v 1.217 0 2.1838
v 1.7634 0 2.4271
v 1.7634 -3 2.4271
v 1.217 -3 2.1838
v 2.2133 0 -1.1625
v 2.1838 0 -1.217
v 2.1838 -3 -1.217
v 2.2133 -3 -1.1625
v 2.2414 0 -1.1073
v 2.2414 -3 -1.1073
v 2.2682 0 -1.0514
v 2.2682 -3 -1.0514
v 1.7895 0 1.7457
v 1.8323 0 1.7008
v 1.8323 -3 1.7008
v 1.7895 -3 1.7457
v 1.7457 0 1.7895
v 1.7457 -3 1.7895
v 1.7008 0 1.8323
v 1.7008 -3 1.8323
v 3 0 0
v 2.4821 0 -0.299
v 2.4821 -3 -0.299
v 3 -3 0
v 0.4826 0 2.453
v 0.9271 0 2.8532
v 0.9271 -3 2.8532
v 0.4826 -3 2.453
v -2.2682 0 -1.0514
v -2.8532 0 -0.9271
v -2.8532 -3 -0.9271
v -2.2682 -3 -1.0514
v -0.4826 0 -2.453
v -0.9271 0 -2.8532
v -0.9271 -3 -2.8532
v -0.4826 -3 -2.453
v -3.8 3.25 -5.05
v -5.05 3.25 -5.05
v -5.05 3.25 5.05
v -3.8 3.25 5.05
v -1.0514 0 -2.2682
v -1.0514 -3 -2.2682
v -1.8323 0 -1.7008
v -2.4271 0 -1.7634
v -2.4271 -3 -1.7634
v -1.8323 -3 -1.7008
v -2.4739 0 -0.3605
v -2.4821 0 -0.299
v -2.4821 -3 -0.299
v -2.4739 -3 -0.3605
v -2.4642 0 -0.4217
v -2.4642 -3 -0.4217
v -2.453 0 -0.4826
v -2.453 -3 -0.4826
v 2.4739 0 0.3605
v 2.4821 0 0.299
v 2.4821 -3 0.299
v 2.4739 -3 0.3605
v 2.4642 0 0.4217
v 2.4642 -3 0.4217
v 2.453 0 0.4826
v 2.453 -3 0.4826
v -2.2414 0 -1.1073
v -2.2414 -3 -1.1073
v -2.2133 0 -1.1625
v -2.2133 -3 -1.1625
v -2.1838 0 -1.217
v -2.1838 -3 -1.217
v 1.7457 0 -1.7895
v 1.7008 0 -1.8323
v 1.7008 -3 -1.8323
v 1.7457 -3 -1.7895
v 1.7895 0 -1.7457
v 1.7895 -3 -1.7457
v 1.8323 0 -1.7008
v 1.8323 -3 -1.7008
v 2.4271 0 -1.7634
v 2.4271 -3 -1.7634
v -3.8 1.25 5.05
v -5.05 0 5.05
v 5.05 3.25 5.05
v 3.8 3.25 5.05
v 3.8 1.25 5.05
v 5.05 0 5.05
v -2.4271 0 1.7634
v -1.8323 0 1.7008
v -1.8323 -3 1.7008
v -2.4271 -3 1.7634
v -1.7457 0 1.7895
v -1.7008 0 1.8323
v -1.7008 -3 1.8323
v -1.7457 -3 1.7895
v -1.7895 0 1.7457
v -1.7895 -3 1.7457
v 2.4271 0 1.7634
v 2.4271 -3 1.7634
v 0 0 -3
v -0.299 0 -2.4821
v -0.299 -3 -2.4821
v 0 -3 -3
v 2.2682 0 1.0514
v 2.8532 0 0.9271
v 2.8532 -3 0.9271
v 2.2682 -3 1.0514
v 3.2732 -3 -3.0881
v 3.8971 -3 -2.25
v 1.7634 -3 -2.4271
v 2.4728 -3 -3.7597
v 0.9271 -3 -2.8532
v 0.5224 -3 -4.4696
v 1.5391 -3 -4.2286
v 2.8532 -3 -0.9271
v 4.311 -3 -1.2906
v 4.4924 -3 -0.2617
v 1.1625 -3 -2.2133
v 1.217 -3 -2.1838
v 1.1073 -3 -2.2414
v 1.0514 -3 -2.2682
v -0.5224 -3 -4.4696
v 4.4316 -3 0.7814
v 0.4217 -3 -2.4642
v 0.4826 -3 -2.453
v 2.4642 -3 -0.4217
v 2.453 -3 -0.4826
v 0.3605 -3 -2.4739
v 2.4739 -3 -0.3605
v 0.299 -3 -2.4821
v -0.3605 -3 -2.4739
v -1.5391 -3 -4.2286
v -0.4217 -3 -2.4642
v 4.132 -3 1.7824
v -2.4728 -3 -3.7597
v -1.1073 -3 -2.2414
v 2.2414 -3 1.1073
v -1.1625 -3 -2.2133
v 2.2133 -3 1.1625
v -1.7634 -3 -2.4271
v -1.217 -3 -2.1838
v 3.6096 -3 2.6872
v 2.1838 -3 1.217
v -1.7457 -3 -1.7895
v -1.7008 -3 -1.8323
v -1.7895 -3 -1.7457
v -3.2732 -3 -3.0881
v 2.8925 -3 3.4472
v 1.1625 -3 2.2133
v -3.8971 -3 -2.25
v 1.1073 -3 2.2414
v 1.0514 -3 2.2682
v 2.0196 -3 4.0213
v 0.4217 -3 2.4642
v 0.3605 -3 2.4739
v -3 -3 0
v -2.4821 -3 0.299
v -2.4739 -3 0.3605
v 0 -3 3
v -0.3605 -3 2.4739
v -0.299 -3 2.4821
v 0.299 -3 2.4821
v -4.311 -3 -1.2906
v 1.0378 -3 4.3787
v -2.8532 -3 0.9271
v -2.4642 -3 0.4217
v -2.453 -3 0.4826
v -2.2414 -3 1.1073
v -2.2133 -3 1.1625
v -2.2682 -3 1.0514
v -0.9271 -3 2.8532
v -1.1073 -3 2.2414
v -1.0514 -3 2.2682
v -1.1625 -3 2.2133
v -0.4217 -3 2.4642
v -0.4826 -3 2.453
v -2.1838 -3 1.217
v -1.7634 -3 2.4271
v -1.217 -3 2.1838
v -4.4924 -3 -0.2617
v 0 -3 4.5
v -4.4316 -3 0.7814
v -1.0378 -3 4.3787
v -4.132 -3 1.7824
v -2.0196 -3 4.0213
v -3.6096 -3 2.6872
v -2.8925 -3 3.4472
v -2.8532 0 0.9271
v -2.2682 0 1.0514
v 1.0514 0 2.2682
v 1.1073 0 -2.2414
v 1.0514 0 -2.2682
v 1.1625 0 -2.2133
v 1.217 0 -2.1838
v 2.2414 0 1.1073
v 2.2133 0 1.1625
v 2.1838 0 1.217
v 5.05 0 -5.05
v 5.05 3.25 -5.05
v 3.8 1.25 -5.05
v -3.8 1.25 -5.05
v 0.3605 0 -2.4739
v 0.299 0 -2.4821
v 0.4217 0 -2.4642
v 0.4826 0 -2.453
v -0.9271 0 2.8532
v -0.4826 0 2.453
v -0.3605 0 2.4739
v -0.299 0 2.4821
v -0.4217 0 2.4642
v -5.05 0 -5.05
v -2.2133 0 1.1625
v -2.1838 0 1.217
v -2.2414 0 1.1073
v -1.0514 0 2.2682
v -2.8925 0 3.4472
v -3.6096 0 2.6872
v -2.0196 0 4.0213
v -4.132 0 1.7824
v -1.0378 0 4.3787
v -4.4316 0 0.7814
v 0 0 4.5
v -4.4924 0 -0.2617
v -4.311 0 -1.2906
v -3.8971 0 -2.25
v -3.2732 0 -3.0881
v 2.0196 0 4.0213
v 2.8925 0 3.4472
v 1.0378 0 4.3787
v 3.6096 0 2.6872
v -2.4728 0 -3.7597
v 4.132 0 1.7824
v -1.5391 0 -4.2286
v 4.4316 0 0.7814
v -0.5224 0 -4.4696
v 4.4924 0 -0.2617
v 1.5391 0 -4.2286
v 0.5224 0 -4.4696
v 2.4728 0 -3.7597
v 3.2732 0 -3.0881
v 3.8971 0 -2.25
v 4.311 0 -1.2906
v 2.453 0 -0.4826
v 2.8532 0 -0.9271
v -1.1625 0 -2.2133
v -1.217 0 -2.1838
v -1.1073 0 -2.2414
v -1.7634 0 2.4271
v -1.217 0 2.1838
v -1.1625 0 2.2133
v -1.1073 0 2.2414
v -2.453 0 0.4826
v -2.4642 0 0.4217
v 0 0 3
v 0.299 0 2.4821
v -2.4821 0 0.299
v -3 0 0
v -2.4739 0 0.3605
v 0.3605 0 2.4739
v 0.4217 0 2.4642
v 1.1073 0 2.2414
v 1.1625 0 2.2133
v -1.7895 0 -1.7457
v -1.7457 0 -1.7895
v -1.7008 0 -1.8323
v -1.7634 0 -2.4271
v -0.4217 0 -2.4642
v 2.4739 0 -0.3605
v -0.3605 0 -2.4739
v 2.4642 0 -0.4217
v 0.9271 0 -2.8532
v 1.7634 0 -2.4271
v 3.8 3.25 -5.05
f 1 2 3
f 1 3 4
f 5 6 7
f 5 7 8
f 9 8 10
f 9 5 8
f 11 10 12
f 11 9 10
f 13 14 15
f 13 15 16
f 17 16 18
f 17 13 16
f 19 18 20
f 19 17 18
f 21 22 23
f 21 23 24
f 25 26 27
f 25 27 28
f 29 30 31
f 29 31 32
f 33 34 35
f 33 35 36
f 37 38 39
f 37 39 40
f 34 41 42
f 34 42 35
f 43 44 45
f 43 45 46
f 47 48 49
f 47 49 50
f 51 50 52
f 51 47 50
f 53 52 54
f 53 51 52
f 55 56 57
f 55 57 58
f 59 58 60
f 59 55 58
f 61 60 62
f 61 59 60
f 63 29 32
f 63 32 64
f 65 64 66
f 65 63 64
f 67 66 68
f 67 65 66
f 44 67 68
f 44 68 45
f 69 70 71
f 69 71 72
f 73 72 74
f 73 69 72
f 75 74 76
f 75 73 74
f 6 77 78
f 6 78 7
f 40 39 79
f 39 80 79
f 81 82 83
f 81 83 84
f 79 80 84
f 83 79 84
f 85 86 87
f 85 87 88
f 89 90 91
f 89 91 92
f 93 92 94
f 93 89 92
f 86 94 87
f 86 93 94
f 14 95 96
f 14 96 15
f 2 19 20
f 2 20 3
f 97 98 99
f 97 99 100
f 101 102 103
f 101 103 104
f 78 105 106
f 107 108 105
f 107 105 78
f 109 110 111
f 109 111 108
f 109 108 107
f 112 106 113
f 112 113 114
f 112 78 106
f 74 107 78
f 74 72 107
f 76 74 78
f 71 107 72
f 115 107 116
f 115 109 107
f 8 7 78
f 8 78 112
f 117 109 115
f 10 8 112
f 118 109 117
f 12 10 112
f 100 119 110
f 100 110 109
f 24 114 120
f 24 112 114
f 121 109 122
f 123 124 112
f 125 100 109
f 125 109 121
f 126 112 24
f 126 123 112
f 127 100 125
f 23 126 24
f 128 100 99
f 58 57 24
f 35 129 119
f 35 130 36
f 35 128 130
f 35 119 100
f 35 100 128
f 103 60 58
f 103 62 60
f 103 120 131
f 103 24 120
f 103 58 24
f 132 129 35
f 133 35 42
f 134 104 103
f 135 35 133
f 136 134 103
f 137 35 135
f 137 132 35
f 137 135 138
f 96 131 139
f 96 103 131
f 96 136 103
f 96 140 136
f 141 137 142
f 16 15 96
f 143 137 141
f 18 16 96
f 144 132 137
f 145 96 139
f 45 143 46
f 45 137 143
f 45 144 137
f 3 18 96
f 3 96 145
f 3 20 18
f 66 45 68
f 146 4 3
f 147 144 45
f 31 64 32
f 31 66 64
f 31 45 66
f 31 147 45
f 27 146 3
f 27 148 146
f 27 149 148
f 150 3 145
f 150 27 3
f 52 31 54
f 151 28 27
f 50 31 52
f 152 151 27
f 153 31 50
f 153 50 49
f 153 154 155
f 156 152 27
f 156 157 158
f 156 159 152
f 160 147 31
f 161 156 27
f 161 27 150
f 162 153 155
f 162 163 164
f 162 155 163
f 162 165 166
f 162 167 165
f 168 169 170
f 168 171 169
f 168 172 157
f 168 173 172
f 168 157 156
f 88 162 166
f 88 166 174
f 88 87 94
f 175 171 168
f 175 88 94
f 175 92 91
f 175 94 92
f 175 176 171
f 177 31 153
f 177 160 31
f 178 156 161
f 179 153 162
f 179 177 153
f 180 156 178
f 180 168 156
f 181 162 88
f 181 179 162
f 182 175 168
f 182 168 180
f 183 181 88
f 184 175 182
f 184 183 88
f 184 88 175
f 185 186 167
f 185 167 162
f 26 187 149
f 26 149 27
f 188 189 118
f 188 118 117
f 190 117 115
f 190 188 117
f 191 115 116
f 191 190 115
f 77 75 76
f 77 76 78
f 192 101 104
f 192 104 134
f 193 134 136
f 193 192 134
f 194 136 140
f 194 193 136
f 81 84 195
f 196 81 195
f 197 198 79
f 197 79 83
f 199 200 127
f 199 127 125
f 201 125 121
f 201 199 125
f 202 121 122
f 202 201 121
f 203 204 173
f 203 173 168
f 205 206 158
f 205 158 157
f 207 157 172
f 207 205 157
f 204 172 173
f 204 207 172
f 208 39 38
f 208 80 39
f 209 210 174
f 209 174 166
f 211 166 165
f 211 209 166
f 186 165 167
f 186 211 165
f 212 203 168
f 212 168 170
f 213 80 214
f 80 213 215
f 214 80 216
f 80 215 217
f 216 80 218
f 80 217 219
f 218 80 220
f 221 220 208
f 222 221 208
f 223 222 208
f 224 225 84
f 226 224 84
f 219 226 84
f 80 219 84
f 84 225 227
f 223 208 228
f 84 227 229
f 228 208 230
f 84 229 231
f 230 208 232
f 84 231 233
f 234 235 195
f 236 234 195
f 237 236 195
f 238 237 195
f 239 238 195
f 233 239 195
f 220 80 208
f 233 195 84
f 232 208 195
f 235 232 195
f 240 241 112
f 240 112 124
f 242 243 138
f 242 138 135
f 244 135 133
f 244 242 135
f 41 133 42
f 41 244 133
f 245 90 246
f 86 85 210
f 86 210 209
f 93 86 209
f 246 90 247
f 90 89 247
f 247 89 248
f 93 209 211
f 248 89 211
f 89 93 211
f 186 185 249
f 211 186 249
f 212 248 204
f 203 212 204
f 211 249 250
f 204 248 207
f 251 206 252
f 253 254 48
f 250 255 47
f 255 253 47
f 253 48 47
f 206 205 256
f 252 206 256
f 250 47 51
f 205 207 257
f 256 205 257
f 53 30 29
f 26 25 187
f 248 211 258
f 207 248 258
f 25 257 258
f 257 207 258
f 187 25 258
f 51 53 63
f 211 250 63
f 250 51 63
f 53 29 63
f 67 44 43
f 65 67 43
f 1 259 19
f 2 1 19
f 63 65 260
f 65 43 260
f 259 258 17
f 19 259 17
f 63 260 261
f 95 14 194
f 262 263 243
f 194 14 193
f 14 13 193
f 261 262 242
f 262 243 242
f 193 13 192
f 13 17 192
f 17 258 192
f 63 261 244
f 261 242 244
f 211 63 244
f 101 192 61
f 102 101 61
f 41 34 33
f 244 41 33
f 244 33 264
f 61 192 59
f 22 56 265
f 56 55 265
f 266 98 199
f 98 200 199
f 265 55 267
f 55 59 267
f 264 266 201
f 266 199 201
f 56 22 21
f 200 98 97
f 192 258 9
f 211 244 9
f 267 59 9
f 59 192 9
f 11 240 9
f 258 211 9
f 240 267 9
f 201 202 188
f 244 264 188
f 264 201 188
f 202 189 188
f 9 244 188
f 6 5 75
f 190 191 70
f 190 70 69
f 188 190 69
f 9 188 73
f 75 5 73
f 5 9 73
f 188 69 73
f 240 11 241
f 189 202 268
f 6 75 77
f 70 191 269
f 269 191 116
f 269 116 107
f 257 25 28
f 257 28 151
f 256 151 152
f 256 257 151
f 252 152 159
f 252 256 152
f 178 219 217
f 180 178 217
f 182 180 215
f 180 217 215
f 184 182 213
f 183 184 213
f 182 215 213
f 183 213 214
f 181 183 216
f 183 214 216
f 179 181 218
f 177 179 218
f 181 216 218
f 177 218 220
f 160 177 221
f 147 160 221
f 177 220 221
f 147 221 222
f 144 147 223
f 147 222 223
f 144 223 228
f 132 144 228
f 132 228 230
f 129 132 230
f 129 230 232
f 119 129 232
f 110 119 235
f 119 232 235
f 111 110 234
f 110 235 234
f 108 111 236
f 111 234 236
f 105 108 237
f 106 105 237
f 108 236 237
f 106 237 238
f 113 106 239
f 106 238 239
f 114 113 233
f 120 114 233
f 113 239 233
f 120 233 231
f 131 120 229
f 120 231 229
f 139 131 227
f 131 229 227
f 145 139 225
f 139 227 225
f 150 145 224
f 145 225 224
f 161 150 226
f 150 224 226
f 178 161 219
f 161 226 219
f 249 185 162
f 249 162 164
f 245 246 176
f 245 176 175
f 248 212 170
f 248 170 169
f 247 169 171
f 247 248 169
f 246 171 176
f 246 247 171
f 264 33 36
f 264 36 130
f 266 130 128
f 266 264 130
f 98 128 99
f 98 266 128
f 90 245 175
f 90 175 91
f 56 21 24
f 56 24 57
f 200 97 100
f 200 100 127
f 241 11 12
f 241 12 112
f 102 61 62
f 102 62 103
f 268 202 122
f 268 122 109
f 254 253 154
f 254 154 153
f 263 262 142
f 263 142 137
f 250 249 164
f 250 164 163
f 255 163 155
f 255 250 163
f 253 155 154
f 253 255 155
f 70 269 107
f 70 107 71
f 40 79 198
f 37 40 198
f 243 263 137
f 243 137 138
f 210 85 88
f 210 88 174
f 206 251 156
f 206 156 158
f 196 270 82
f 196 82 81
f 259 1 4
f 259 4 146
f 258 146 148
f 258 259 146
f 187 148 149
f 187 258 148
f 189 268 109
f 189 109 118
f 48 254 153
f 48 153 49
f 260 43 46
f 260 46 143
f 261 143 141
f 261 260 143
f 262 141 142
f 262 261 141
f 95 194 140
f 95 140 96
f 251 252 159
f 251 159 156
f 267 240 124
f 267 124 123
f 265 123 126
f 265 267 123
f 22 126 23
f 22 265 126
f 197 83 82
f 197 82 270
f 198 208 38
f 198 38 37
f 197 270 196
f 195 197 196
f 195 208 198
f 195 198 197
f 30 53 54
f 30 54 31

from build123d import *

# Parameters (mm, degrees)
SKETCH1_R           = 0.5
SKETCH1_R_2         = 1.375
BOSS_EXTRUDE1_DEPTH = 2
SKETCH4_R           = 4.5
SKETCH4_R_2         = 2.5
BOSS_EXTRUDE3_DEPTH = 3
CUT_EXTRUDE3_START  = -3
CUT_EXTRUDE3_DEPTH  = 3
SKETCH6_W           = 34.029642768
SKETCH6_H           = 33.796563024
CUT_EXTRUDE4_DEPTH  = 22.43595111
SKETCH7_W           = 10.1
SKETCH7_H           = 10.1
BOSS_EXTRUDE4_DEPTH = 1.25
SKETCH8_W           = 1.25
SKETCH8_H           = 10.1
BOSS_EXTRUDE5_DEPTH = 2


with BuildPart() as part:
    # Sketch1 → Boss-Extrude1 (new body)
    with BuildSketch(Plane(origin=(0, 0, 0), x_dir=(1, 0, 0), z_dir=(0, 1, 0))):
        with BuildLine():
            Line((-4, 4), (-2.467435953, 13.402193757))
            ThreePointArc((-2.467435953, 13.402193757), (0, 15.5), (2.467435953, 13.402193757))
            Line((2.467435953, 13.402193757), (4, 4))
            Line((4, 4), (12.448472752, 2.459445505))
            ThreePointArc((12.448472752, 2.459445505), (14.5, 0), (12.448472752, -2.459445505))
            Line((12.448472752, -2.459445505), (4, -4))
            Line((4, -4), (2.467435953, -13.402193757))
            ThreePointArc((2.467435953, -13.402193757), (0, -15.5), (-2.467435953, -13.402193757))
            Line((-2.467435953, -13.402193757), (-4, -4))
            Line((-4, -4), (-12.448472752, -2.459445505))
            ThreePointArc((-12.448472752, -2.459445505), (-14.5, 0), (-12.448472752, 2.459445505))
            Line((-12.448472752, 2.459445505), (-4, 4))
        make_face()
        with Locations(Location((0, 12, 0), (0, 0, 270))):
            Circle(SKETCH1_R, mode=Mode.SUBTRACT)
        with Locations(Location((0, 9.5, 0), (0, 0, 270))):
            Circle(SKETCH1_R, mode=Mode.SUBTRACT)
        with Locations(Location((0, 7.5, 0), (0, 0, 270))):
            Circle(SKETCH1_R, mode=Mode.SUBTRACT)
        with Locations(Location((12, 0, 0), (0, 0, 270))):
            Circle(SKETCH1_R, mode=Mode.SUBTRACT)
        with Locations(Location((9.5, 0, 0), (0, 0, 270))):
            Circle(SKETCH1_R, mode=Mode.SUBTRACT)
        with Locations(Location((7.5, 0, 0), (0, 0, 270))):
            Circle(SKETCH1_R, mode=Mode.SUBTRACT)
        with Locations(Location((0, -12, 0), (0, 0, 270))):
            Circle(SKETCH1_R, mode=Mode.SUBTRACT)
        with Locations(Location((0, -9.5, 0), (0, 0, 270))):
            Circle(SKETCH1_R, mode=Mode.SUBTRACT)
        with Locations(Location((0, -7.5, 0), (0, 0, 270))):
            Circle(SKETCH1_R, mode=Mode.SUBTRACT)
        with Locations(Location((-12, 0, 0), (0, 0, 270))):
            Circle(SKETCH1_R, mode=Mode.SUBTRACT)
        with Locations(Location((-9.5, 0, 0), (0, 0, 270))):
            Circle(SKETCH1_R, mode=Mode.SUBTRACT)
        with Locations(Location((-7.5, 0, 0), (0, 0, 270))):
            Circle(SKETCH1_R, mode=Mode.SUBTRACT)
        with Locations(Location((0, 0, 0), (0, 0, 270))):
            Circle(SKETCH1_R_2, mode=Mode.SUBTRACT)
    extrude(amount=BOSS_EXTRUDE1_DEPTH)

    # Sketch4 → Boss-Extrude3 (add)
    with BuildSketch(Plane.XZ):
        with Locations(Location((0, 0, 0), (0, 0, 90))):
            Circle(SKETCH4_R)
        with Locations(Location((0, 0, 0), (0, 0, 270))):
            Circle(SKETCH4_R_2, mode=Mode.SUBTRACT)
    extrude(amount=BOSS_EXTRUDE3_DEPTH)

    # Sketch5 → Cut-Extrude3 (cut)
    with BuildSketch(Plane.XZ.offset(3).offset(CUT_EXTRUDE3_START)):
        with BuildLine():
            Line((0.299038106, 2.482050808), (0, 3))
            Line((0, 3), (-0.299038106, 2.482050808))
            ThreePointArc((-0.299038106, 2.482050808), (-0.391086163, 2.469220851), (-0.482593741, 2.452978451))
            Line((-0.482593741, 2.452978451), (-0.927050983, 2.853169549))
            Line((-0.927050983, 2.853169549), (-1.051398019, 2.268162738))
            ThreePointArc((-1.051398019, 2.268162738), (-1.134976249, 2.22751631), (-1.216985951, 2.183791473))
            Line((-1.216985951, 2.183791473), (-1.763355757, 2.427050983))
            Line((-1.763355757, 2.427050983), (-1.70083977, 1.832251096))
            ThreePointArc((-1.70083977, 1.832251096), (-1.767766953, 1.767766953), (-1.832251096, 1.70083977))
            Line((-1.832251096, 1.70083977), (-2.427050983, 1.763355757))
            Line((-2.427050983, 1.763355757), (-2.183791473, 1.216985951))
            ThreePointArc((-2.183791473, 1.216985951), (-2.22751631, 1.134976249), (-2.268162738, 1.051398019))
            Line((-2.268162738, 1.051398019), (-2.853169549, 0.927050983))
            Line((-2.853169549, 0.927050983), (-2.452978451, 0.482593741))
            ThreePointArc((-2.452978451, 0.482593741), (-2.469220851, 0.391086163), (-2.482050808, 0.299038106))
            Line((-2.482050808, 0.299038106), (-3, 0))
            Line((-3, 0), (-2.482050808, -0.299038106))
            ThreePointArc((-2.482050808, -0.299038106), (-2.469220851, -0.391086163), (-2.452978451, -0.482593741))
            Line((-2.452978451, -0.482593741), (-2.853169549, -0.927050983))
            Line((-2.853169549, -0.927050983), (-2.268162738, -1.051398019))
            ThreePointArc((-2.268162738, -1.051398019), (-2.22751631, -1.134976249), (-2.183791473, -1.216985951))
            Line((-2.183791473, -1.216985951), (-2.427050983, -1.763355757))
            Line((-2.427050983, -1.763355757), (-1.832251096, -1.70083977))
            ThreePointArc((-1.832251096, -1.70083977), (-1.767766953, -1.767766953), (-1.70083977, -1.832251096))
            Line((-1.70083977, -1.832251096), (-1.763355757, -2.427050983))
            Line((-1.763355757, -2.427050983), (-1.216985951, -2.183791473))
            ThreePointArc((-1.216985951, -2.183791473), (-1.134976249, -2.22751631), (-1.051398019, -2.268162738))
            Line((-1.051398019, -2.268162738), (-0.927050983, -2.853169549))
            Line((-0.927050983, -2.853169549), (-0.482593741, -2.452978451))
            ThreePointArc((-0.482593741, -2.452978451), (-0.391086163, -2.469220851), (-0.299038106, -2.482050808))
            Line((-0.299038106, -2.482050808), (0, -3))
            Line((0, -3), (0.299038106, -2.482050808))
            ThreePointArc((0.299038106, -2.482050808), (0.391086163, -2.469220851), (0.482593741, -2.452978451))
            Line((0.482593741, -2.452978451), (0.927050983, -2.853169549))
            Line((0.927050983, -2.853169549), (1.051398019, -2.268162738))
            ThreePointArc((1.051398019, -2.268162738), (1.134976249, -2.22751631), (1.216985951, -2.183791473))
            Line((1.216985951, -2.183791473), (1.763355757, -2.427050983))
            Line((1.763355757, -2.427050983), (1.70083977, -1.832251096))
            ThreePointArc((1.70083977, -1.832251096), (1.767766953, -1.767766953), (1.832251096, -1.70083977))
            Line((1.832251096, -1.70083977), (2.427050983, -1.763355757))
            Line((2.427050983, -1.763355757), (2.183791473, -1.216985951))
            ThreePointArc((2.183791473, -1.216985951), (2.22751631, -1.134976249), (2.268162738, -1.051398019))
            Line((2.268162738, -1.051398019), (2.853169549, -0.927050983))
            Line((2.853169549, -0.927050983), (2.452978451, -0.482593741))
            ThreePointArc((2.452978451, -0.482593741), (2.469220851, -0.391086163), (2.482050808, -0.299038106))
            Line((2.482050808, -0.299038106), (3, 0))
            Line((3, 0), (2.482050808, 0.299038106))
            ThreePointArc((2.482050808, 0.299038106), (2.469220851, 0.391086163), (2.452978451, 0.482593741))
            Line((2.452978451, 0.482593741), (2.853169549, 0.927050983))
            Line((2.853169549, 0.927050983), (2.268162738, 1.051398019))
            ThreePointArc((2.268162738, 1.051398019), (2.22751631, 1.134976249), (2.183791473, 1.216985951))
            Line((2.183791473, 1.216985951), (2.427050983, 1.763355757))
            Line((2.427050983, 1.763355757), (1.832251096, 1.70083977))
            ThreePointArc((1.832251096, 1.70083977), (1.767766953, 1.767766953), (1.70083977, 1.832251096))
            Line((1.70083977, 1.832251096), (1.763355757, 2.427050983))
            Line((1.763355757, 2.427050983), (1.216985951, 2.183791473))
            ThreePointArc((1.216985951, 2.183791473), (1.134976249, 2.22751631), (1.051398019, 2.268162738))
            Line((1.051398019, 2.268162738), (0.927050983, 2.853169549))
            Line((0.927050983, 2.853169549), (0.482593741, 2.452978451))
            ThreePointArc((0.482593741, 2.452978451), (0.391086163, 2.469220851), (0.299038106, 2.482050808))
        make_face()
    extrude(amount=CUT_EXTRUDE3_DEPTH, mode=Mode.SUBTRACT)

    # Sketch6 → Cut-Extrude4 (cut, through all)
    with BuildSketch(Plane(origin=(0, 0, 0), x_dir=(-1, 0, 0), z_dir=(0, -1, 0))):
        Rectangle(SKETCH6_W, SKETCH6_H)
    extrude(amount=-CUT_EXTRUDE4_DEPTH, mode=Mode.SUBTRACT)

    # Sketch7 → Boss-Extrude4 (add)
    with BuildSketch(Plane(origin=(0, 0, 0), x_dir=(1, 0, 0), z_dir=(0, 1, 0))):
        Rectangle(SKETCH7_W, SKETCH7_H)
    extrude(amount=BOSS_EXTRUDE4_DEPTH)

    # Sketch8 → Boss-Extrude5 (add)
    with BuildSketch(Plane(origin=(0, 1.25, 0), x_dir=(1, 0, 0), z_dir=(0, 1, 0))):
        with Locations((-4.425, 0)):
            Rectangle(SKETCH8_W, SKETCH8_H)
        with Locations((4.425, 0)):
            Rectangle(SKETCH8_W, SKETCH8_H)
    extrude(amount=BOSS_EXTRUDE5_DEPTH)


solid = part.part
